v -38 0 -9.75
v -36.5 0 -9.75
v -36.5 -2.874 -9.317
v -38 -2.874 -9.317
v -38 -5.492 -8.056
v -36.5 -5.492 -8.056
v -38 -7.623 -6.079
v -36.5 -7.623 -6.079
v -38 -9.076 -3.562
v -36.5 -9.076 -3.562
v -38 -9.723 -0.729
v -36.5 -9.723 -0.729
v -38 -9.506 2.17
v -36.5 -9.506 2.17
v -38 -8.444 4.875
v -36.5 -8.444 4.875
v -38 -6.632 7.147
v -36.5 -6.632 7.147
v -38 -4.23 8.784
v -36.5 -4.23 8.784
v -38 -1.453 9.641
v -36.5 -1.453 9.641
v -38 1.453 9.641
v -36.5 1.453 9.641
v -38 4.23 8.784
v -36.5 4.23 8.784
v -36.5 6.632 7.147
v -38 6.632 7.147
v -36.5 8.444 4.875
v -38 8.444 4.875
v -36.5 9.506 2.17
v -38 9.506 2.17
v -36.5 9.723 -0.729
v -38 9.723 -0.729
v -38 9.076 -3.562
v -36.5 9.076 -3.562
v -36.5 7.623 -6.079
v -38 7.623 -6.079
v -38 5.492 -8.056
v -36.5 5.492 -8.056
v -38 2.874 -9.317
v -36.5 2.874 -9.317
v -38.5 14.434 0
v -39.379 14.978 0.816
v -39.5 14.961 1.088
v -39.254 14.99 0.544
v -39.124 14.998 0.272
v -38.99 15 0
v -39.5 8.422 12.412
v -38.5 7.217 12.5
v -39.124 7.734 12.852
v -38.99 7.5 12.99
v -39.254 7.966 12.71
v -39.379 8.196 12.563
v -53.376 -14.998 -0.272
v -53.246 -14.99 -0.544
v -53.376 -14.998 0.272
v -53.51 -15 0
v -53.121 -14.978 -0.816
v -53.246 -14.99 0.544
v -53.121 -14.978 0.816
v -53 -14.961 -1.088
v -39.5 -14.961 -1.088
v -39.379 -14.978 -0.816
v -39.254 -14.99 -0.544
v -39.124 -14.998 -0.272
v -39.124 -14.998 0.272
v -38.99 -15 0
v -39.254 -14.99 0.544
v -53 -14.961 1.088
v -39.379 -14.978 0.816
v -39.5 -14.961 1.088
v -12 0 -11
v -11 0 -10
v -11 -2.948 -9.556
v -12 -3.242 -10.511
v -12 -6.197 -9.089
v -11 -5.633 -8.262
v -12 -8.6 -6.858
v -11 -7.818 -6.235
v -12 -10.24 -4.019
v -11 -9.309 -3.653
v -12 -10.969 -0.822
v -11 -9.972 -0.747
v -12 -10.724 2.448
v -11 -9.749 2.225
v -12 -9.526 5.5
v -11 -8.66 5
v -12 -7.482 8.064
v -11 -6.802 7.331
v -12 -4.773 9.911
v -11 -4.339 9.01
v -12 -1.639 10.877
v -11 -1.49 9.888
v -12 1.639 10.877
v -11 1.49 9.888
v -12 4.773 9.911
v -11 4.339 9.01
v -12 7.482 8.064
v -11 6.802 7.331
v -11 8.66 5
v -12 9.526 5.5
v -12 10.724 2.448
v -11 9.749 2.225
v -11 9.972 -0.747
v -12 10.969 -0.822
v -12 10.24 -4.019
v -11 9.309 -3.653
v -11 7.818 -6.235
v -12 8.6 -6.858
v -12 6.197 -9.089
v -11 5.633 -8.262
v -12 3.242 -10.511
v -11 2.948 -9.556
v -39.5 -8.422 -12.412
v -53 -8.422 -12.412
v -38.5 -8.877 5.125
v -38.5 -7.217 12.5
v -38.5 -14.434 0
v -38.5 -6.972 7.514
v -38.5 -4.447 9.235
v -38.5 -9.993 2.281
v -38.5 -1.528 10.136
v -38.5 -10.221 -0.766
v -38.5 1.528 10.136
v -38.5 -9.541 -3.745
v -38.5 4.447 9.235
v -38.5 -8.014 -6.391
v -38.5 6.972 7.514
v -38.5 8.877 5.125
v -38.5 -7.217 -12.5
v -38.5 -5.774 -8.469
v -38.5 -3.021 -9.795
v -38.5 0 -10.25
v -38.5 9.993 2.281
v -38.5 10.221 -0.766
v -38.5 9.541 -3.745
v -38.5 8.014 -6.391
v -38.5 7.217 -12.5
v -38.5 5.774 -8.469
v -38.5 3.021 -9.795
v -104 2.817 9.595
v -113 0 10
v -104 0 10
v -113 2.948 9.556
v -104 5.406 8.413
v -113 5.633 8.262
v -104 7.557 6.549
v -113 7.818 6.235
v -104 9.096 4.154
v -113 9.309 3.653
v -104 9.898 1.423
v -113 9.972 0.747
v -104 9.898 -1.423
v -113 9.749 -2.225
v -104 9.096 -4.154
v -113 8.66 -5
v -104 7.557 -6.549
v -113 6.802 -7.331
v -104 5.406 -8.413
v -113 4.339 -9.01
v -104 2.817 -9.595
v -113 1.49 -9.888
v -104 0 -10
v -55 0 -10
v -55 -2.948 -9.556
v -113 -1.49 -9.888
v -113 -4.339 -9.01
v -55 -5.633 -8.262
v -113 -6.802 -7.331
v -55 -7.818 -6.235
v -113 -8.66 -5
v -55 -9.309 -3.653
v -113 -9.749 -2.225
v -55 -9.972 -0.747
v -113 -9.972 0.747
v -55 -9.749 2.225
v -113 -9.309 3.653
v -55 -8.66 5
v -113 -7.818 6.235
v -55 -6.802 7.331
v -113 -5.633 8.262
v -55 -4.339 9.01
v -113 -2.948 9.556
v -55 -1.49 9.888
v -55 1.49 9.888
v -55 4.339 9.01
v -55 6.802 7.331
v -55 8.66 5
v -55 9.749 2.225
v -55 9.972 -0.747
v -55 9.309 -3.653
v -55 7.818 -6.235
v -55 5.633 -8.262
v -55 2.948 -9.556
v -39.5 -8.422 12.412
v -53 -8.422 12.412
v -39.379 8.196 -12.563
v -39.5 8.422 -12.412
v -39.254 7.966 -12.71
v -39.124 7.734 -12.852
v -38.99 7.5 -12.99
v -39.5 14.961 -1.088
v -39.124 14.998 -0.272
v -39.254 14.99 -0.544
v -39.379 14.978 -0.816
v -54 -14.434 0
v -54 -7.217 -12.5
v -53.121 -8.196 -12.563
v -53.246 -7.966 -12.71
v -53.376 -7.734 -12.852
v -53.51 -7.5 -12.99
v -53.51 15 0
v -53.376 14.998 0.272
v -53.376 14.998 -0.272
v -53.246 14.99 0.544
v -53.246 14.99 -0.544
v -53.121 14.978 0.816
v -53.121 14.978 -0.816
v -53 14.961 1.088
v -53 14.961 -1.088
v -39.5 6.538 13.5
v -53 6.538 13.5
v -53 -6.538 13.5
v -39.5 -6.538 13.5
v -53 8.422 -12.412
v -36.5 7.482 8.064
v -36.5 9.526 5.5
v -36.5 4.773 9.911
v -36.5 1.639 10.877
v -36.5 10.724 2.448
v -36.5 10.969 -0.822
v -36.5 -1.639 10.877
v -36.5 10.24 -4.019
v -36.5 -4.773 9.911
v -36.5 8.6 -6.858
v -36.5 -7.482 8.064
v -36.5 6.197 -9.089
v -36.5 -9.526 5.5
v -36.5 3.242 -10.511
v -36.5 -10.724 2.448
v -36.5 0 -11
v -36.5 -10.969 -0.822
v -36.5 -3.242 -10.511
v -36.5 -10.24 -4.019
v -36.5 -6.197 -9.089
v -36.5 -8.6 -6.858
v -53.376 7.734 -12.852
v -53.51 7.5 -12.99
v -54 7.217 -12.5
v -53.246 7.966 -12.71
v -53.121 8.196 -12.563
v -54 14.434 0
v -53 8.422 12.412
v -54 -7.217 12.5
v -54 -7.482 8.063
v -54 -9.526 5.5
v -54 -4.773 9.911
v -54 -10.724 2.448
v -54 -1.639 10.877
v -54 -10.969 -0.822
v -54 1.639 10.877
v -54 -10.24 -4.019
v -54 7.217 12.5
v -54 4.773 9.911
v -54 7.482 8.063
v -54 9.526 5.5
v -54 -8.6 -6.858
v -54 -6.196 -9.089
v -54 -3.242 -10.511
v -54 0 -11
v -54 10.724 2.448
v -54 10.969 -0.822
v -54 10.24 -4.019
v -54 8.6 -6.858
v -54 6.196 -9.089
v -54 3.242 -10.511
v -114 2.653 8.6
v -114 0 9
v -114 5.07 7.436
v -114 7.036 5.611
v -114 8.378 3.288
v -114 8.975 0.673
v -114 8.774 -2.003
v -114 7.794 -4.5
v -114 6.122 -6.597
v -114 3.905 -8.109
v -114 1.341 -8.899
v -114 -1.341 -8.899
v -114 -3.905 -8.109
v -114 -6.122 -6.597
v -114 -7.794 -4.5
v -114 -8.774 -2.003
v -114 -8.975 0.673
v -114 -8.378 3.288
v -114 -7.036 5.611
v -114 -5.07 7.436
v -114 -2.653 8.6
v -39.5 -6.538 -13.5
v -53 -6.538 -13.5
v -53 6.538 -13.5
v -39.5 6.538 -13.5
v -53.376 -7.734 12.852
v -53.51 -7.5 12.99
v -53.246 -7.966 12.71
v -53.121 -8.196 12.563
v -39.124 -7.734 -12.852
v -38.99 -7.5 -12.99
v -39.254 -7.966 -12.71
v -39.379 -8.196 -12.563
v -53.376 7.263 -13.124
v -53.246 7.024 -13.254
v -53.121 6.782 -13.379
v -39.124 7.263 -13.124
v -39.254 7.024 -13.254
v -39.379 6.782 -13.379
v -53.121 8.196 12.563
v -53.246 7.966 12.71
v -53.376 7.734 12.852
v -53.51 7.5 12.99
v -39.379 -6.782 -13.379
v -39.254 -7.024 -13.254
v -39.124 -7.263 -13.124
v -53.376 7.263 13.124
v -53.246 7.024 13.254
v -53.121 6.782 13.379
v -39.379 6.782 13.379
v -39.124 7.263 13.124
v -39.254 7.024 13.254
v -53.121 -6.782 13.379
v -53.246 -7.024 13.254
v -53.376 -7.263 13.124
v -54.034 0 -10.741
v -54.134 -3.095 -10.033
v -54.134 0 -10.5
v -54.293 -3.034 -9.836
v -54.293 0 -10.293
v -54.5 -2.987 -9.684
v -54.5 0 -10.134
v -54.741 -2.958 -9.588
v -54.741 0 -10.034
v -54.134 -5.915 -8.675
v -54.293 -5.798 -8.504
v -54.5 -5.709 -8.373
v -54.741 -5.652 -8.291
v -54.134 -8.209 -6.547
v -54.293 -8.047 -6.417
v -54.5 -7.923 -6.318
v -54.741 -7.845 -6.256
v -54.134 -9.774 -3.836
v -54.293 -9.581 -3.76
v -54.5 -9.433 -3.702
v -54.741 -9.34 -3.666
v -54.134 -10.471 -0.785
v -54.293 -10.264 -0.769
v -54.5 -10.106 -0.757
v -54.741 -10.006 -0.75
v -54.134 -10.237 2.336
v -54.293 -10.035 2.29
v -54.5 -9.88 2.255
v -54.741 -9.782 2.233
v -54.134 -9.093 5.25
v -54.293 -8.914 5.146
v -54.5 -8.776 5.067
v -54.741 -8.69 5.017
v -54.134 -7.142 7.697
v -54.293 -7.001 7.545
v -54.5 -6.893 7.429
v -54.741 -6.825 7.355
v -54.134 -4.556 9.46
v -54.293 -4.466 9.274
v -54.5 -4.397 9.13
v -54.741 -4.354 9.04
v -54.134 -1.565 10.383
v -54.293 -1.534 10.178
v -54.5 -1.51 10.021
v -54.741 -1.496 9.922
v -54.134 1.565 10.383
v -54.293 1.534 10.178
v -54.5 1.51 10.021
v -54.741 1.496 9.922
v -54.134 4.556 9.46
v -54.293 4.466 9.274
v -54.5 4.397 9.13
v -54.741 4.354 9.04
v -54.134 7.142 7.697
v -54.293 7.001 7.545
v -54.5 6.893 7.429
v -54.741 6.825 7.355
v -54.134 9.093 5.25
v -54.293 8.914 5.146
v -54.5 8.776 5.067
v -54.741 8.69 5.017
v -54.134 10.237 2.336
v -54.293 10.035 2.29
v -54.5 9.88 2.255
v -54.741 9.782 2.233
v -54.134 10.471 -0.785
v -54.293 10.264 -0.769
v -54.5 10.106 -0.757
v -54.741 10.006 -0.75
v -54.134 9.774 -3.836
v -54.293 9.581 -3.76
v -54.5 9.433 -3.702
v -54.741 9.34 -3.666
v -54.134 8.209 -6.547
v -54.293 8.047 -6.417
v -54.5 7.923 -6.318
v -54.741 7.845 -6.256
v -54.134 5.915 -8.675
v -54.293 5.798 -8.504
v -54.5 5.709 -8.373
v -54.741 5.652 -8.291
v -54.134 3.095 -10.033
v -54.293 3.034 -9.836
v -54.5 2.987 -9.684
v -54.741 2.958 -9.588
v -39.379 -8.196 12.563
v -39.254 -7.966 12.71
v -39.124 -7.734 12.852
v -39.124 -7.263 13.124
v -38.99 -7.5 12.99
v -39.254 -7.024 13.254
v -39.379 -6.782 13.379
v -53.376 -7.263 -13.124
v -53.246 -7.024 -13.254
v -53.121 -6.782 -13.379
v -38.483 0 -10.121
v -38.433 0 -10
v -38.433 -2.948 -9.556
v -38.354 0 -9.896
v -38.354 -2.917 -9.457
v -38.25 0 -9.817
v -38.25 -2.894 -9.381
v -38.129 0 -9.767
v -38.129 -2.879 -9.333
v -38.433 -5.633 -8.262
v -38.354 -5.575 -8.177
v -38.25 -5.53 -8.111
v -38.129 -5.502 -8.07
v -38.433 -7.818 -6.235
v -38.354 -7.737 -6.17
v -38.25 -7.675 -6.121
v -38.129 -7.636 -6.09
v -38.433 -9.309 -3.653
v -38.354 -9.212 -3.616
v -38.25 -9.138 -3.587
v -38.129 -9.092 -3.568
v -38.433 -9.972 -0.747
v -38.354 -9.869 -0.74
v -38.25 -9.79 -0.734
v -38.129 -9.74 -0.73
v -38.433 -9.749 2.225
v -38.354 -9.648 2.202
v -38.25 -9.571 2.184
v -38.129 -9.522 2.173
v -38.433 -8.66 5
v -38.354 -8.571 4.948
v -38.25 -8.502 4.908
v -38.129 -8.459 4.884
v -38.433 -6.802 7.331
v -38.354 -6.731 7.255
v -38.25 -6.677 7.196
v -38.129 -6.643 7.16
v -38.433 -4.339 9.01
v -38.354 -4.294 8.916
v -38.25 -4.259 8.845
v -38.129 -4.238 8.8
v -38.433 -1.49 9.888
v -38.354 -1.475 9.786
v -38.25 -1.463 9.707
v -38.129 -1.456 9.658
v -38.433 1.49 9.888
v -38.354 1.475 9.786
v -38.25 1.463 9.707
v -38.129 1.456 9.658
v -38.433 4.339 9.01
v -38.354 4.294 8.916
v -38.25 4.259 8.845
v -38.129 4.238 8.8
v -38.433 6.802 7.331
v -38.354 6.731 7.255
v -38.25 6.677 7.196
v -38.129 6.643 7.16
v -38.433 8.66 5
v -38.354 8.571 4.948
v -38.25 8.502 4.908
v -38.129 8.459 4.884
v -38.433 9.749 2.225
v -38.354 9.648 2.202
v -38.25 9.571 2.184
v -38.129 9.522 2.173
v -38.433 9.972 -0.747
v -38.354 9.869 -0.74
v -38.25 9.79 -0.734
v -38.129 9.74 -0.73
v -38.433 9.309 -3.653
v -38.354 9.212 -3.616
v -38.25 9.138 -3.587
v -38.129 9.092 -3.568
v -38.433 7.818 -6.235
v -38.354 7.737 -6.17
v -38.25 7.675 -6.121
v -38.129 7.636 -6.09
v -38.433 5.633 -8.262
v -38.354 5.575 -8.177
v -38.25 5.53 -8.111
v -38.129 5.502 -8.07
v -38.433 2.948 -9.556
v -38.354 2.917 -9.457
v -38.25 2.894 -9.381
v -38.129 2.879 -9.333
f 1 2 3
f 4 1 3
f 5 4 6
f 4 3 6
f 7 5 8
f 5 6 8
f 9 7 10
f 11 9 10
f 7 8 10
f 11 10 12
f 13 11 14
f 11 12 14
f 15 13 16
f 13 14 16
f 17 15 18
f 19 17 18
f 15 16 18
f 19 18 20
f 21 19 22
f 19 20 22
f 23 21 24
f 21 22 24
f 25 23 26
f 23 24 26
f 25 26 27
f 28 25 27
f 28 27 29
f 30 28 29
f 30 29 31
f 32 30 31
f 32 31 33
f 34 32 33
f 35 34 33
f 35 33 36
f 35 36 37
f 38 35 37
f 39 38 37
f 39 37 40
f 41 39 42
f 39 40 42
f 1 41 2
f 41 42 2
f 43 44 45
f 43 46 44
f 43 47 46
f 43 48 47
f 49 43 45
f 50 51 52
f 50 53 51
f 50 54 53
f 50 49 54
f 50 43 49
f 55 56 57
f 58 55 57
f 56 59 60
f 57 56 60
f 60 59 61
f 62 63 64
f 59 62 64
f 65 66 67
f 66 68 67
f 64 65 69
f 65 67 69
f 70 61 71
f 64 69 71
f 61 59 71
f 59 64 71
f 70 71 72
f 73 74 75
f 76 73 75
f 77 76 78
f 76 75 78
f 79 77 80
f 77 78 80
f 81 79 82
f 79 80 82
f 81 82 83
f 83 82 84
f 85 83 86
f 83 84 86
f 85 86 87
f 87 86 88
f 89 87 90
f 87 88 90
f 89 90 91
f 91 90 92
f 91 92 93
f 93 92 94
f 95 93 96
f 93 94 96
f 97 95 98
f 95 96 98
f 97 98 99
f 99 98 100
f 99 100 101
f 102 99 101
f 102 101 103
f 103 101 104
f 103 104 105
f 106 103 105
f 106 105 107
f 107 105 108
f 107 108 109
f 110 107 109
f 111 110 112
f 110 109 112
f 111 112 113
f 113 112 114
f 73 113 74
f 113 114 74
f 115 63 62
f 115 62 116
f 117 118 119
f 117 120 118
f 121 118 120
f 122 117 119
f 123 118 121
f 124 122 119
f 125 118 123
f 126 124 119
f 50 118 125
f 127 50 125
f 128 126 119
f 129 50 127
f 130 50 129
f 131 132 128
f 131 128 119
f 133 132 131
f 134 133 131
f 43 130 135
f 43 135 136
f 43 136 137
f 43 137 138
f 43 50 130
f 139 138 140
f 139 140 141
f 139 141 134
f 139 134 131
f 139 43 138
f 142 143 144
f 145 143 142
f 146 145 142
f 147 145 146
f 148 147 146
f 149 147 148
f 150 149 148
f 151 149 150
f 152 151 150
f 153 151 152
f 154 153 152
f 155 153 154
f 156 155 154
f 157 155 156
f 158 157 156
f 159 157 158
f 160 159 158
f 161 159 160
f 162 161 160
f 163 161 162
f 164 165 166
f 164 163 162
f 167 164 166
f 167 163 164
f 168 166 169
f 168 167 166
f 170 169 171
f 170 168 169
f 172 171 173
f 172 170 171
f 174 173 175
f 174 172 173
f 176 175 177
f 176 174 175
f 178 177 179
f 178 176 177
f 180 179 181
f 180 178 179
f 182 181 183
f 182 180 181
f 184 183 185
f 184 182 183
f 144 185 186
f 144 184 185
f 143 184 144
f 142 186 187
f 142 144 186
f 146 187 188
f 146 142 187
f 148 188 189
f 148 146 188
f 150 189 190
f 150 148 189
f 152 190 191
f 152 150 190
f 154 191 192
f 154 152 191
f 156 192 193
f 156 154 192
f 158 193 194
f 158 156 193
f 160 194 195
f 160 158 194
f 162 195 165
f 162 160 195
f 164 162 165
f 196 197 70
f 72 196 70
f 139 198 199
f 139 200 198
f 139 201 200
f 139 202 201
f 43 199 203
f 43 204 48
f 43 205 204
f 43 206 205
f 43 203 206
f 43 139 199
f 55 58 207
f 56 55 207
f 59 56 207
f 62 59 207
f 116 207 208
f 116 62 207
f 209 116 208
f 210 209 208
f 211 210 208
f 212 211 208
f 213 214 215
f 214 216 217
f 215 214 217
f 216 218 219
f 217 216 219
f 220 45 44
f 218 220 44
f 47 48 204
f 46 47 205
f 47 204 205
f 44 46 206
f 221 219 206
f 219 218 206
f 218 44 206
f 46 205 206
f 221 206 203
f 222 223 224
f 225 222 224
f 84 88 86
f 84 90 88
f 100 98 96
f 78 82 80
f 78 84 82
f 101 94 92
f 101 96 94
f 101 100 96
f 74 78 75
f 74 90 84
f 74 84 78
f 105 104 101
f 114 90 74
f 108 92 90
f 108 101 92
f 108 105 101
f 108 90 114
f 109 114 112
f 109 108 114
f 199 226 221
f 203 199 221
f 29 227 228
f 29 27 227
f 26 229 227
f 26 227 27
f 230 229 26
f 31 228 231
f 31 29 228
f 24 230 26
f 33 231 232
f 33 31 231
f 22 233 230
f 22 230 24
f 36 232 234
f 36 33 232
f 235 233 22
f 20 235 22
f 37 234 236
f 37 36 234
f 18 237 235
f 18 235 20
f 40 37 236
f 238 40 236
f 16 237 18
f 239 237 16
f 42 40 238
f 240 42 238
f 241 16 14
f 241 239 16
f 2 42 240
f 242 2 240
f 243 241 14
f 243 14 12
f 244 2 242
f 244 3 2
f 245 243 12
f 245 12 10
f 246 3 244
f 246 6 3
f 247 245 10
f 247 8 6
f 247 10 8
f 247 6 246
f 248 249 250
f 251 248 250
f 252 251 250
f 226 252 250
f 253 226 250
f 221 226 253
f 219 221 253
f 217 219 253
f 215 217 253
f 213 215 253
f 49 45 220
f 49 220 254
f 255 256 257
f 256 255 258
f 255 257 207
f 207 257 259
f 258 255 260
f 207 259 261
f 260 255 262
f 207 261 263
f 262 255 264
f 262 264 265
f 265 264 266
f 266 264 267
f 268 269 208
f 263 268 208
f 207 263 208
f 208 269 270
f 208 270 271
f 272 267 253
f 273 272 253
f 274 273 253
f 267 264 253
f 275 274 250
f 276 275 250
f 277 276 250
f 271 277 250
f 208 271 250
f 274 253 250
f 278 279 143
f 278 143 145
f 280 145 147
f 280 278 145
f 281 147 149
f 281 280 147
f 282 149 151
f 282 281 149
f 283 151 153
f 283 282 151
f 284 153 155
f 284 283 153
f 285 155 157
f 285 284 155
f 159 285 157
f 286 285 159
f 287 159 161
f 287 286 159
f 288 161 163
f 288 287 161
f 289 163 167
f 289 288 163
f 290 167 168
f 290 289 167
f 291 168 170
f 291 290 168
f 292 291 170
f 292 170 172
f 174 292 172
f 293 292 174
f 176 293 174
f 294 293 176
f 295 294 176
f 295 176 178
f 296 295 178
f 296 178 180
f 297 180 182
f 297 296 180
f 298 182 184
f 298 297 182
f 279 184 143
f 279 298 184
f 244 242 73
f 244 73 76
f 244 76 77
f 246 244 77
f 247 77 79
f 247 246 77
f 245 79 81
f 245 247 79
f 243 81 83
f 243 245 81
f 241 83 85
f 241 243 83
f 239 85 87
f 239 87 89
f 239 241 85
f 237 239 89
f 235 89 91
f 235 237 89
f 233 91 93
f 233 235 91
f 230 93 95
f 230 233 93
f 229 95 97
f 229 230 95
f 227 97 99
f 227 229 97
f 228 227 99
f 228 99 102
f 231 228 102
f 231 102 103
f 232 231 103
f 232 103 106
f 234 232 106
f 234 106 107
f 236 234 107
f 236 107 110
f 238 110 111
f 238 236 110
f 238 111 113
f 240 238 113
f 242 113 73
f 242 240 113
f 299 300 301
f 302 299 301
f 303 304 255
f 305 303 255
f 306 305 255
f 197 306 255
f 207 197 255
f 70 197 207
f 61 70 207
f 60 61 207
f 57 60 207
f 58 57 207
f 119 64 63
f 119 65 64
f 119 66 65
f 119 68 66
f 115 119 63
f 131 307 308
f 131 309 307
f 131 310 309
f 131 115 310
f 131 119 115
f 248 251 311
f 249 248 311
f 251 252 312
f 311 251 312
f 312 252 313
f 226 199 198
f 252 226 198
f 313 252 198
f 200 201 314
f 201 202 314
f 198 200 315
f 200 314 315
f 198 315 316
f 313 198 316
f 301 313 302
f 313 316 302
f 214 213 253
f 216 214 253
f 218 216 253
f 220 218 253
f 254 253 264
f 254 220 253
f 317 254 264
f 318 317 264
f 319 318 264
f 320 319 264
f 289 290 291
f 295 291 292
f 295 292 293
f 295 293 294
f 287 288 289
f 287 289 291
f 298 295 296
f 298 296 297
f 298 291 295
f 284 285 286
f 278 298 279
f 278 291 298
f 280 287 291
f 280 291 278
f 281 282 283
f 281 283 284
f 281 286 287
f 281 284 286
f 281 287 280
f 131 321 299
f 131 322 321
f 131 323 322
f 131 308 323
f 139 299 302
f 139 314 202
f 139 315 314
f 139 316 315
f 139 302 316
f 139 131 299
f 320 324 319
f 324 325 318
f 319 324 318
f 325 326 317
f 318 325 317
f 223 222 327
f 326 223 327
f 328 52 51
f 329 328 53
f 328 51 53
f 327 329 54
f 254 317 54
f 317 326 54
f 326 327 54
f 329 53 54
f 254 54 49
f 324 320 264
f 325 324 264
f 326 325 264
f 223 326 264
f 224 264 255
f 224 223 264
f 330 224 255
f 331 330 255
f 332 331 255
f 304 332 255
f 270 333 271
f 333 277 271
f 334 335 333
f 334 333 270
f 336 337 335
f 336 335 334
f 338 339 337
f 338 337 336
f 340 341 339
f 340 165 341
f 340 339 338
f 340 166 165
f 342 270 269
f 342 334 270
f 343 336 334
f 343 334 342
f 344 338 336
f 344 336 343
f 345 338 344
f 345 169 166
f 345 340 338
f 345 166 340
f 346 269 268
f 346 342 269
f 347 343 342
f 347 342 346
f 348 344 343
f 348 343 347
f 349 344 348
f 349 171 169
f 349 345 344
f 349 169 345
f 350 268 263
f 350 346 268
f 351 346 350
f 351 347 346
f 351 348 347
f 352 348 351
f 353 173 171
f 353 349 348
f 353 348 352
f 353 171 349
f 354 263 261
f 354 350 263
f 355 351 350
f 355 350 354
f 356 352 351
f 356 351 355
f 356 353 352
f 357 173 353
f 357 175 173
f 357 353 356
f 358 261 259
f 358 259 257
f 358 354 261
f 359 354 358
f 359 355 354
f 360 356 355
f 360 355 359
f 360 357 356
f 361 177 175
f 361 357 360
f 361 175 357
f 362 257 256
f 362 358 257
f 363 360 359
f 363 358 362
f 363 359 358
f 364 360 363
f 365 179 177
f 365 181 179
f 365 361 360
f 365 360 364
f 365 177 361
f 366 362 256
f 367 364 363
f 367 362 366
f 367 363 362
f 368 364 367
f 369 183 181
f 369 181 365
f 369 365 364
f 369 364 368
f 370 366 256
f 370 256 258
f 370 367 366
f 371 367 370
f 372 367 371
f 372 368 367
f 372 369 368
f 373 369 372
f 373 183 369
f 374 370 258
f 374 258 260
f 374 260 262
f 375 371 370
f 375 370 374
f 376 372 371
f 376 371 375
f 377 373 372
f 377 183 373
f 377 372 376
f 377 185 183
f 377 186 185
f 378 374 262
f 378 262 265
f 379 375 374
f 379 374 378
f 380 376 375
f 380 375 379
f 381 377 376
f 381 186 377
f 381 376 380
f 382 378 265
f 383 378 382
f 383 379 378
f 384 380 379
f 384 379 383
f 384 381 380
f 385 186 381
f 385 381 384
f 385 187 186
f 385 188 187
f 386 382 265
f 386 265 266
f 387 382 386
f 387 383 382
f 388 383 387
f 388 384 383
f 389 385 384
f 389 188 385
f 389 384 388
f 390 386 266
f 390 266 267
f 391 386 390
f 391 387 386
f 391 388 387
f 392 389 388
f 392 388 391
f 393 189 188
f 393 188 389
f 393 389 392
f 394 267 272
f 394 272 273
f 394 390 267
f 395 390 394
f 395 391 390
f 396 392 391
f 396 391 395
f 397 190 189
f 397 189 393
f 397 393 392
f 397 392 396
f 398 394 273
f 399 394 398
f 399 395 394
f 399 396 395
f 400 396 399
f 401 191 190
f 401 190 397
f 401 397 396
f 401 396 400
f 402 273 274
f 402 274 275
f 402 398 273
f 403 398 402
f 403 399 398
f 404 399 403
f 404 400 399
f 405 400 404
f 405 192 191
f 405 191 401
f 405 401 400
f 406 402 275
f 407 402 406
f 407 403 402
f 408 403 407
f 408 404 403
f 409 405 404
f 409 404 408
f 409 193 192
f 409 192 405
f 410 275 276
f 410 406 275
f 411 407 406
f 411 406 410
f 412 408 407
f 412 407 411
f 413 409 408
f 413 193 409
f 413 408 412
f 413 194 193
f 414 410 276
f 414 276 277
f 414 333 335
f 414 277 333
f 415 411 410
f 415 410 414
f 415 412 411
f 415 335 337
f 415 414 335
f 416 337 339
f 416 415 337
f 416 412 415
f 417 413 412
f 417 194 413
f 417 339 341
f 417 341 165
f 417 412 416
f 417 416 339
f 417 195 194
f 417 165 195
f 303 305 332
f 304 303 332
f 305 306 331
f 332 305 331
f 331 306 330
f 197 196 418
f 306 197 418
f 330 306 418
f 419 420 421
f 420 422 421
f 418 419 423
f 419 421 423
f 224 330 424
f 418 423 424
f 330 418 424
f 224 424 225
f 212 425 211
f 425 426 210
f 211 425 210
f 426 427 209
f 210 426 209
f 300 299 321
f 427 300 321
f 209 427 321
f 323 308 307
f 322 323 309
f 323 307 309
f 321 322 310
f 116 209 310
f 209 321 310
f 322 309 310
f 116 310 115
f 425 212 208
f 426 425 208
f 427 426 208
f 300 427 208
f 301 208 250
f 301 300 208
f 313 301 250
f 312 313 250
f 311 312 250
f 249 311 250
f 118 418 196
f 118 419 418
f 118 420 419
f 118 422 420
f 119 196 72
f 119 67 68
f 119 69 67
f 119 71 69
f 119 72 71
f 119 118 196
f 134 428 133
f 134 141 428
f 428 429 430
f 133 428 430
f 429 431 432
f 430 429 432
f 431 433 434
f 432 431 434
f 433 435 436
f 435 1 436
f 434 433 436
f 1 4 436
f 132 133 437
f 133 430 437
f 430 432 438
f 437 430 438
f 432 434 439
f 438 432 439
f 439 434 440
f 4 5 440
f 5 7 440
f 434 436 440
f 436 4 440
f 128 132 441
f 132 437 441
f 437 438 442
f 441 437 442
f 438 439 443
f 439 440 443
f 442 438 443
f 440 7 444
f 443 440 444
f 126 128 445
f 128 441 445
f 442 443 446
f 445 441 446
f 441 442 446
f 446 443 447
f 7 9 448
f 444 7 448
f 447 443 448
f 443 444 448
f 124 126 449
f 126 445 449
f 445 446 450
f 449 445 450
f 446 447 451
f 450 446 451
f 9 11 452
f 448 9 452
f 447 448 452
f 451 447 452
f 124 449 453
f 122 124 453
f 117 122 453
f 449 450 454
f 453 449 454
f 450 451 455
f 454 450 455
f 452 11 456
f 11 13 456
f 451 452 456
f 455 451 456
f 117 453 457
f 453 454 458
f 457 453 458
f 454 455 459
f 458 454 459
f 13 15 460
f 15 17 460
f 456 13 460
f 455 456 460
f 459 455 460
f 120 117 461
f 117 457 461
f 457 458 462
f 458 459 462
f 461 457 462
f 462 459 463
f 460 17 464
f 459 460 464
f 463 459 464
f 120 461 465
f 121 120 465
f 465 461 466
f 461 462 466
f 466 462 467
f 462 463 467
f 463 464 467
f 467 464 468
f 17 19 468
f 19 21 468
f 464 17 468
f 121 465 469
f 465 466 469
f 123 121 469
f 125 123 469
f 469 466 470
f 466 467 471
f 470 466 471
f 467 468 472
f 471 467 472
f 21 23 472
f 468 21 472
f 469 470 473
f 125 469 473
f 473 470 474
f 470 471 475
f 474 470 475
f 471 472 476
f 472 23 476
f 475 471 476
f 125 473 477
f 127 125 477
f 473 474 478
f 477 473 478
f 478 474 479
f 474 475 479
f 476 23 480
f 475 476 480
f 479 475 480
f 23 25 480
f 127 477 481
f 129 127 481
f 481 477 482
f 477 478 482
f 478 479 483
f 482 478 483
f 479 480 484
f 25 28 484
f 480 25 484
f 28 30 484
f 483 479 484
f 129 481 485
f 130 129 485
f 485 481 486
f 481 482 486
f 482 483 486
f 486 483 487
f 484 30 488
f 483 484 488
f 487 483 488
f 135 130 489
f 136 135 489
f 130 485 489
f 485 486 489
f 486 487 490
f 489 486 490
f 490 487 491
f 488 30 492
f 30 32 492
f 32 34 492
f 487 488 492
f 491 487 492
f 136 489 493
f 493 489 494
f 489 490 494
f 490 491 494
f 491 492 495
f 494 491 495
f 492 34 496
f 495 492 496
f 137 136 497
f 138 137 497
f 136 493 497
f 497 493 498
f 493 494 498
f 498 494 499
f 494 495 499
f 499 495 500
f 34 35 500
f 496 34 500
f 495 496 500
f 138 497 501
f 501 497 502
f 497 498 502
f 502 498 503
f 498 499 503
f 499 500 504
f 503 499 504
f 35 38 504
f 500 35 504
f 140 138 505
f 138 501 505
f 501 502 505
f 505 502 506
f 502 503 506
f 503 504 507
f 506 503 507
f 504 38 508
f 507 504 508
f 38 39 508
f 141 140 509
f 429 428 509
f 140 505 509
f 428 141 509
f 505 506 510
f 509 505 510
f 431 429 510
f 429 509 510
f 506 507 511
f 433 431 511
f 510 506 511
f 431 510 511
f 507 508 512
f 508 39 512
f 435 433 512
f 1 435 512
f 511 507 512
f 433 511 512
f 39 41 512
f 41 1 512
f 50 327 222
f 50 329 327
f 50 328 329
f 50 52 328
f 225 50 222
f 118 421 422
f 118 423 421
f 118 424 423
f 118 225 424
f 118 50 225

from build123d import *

# Parameters (mm, degrees)
CHAFL_N1_SIZE           = 1
REDONDEO1_R             = 1
CROQUIS2_R              = 21.776851014
CORTAR_EXTRUIR1_DEPTH   = 11
CHAFL_N2_SIZE           = 1
SALIENTE_EXTRUIR1_DEPTH = 15.5
CROQUIS12_W             = 2
CROQUIS12_H             = 2
REDONDEO3_R             = 0.5
SALIENTE_EXTRUIR3_START = 10
CROQUIS15_R             = 10
SALIENTE_EXTRUIR3_DEPTH = 10
CHAFL_N6_SIZE           = 1
CHAFL_N8_SIZE           = 1
CORTAR_EXTRUIR3_START   = -15.009619
CROQUIS17_R             = 19.700918629
CROQUIS17_R_2           = 15
CORTAR_EXTRUIR3_DEPTH   = 14.519238


with BuildPart() as part:
    # Croquis1 → Revolución1 (revolve)
    with BuildSketch(Plane(origin=(0, 0, 0), x_dir=(1, 0, 0), z_dir=(0, 1, 0))):
        Polygon((0, 0), (0, 11), (-50, 11), (-54, 11), (-54, 10), (-104, 10), (-104, 0), align=None)
    revolve(axis=Axis((0, 0, 0), (-1, 0, 0)))

    # Chaflán1
    chafl_n1_edges = [part.edges().sort_by_distance(p)[0] for p in [
        (0, 0, 11),
    ]]
    chamfer(chafl_n1_edges, length=CHAFL_N1_SIZE)

    # Redondeo1
    redondeo1_edges = [part.edges().sort_by_distance(p)[0] for p in [
        (-54, 0, 10),
    ]]
    fillet(redondeo1_edges, radius=REDONDEO1_R - 0.0001)  # a hair under: the kernel refuses the full size

    # Croquis2 → Cortar-Extruir1 (cut)
    with BuildSketch(Plane(origin=(0, 0, 0), x_dir=(0, 0, -1), z_dir=(1, 0, 0))):
        Circle(CROQUIS2_R)
    extrude(amount=-CORTAR_EXTRUIR1_DEPTH, mode=Mode.SUBTRACT)

    # Chaflán2
    chafl_n2_edges = [part.edges().sort_by_distance(p)[0] for p in [
        (-11, 0, 11),
    ]]
    chamfer(chafl_n2_edges, length=CHAFL_N2_SIZE)

    # Croquis10 → Saliente-Extruir1 (add)
    with BuildSketch(Plane(origin=(-54, 0, 0), x_dir=(0, 0, -1), z_dir=(1, 0, 0))):
        Polygon((-13.5, 7.794228634), (-13.5, -7.794228634), (0, -15.588457268), (13.5, -7.794228634), (13.5, 7.794228634), (0, 15.588457268), align=None)
    extrude(amount=SALIENTE_EXTRUIR1_DEPTH)

    # Croquis12 → Cortar-Revolución1 (revolve, cut)
    with BuildSketch(Plane(origin=(0, 0, 0), x_dir=(1, 0, 0), z_dir=(0, 1, 0)), mode=Mode.PRIVATE) as cortar_revoluci_n1_sk:
        with Locations((-37.5, -10.75)):
            Rectangle(CROQUIS12_W, CROQUIS12_H)
    revolve(cortar_revoluci_n1_sk.sketch.rotate(Axis((0, 0, 0), (-1, 0, 0)), 180), axis=Axis((0, 0, 0), (-1, 0, 0)), mode=Mode.SUBTRACT)

    # Redondeo3
    redondeo3_edges = [part.edges().sort_by_distance(p)[0] for p in [
        (-38.5, 0, 9.75),
    ]]
    fillet(redondeo3_edges, radius=REDONDEO3_R)

    # Croquis15 → Saliente-Extruir3 (add)
    with BuildSketch(Plane.ZY.offset(104).offset(SALIENTE_EXTRUIR3_START)):
        Circle(CROQUIS15_R)
    extrude(amount=-SALIENTE_EXTRUIR3_DEPTH)

    # Chaflán6
    chafl_n6_edges = [part.edges().sort_by_distance(p)[0] for p in [
        (-114, 0, -10),
    ]]
    chamfer(chafl_n6_edges, length=CHAFL_N6_SIZE)

    # Chaflán8
    chafl_n8_edges = [part.edges().sort_by_distance(p)[0] for p in [
        (-54, 11.691342951, 6.75),
        (-54, 0, 13.5),
        (-54, -11.691342951, 6.75),
        (-54, -11.691342951, -6.75),
        (-54, 0, -13.5),
        (-54, 11.691342951, -6.75),
        (-38.5, 11.691342951, 6.75),
        (-38.5, 0, 13.5),
        (-38.5, -11.691342951, 6.75),
        (-38.5, -11.691342951, -6.75),
        (-38.5, 0, -13.5),
        (-38.5, 11.691342951, -6.75),
    ]]
    chamfer(chafl_n8_edges, length=CHAFL_N8_SIZE)

    # Croquis17 → Cortar-Extruir3 (cut)
    with BuildSketch(Plane.ZY.offset(54).offset(CORTAR_EXTRUIR3_START)):
        Circle(CROQUIS17_R)
        Circle(CROQUIS17_R_2, mode=Mode.SUBTRACT)
    extrude(amount=CORTAR_EXTRUIR3_DEPTH, mode=Mode.SUBTRACT)


solid = part.part
